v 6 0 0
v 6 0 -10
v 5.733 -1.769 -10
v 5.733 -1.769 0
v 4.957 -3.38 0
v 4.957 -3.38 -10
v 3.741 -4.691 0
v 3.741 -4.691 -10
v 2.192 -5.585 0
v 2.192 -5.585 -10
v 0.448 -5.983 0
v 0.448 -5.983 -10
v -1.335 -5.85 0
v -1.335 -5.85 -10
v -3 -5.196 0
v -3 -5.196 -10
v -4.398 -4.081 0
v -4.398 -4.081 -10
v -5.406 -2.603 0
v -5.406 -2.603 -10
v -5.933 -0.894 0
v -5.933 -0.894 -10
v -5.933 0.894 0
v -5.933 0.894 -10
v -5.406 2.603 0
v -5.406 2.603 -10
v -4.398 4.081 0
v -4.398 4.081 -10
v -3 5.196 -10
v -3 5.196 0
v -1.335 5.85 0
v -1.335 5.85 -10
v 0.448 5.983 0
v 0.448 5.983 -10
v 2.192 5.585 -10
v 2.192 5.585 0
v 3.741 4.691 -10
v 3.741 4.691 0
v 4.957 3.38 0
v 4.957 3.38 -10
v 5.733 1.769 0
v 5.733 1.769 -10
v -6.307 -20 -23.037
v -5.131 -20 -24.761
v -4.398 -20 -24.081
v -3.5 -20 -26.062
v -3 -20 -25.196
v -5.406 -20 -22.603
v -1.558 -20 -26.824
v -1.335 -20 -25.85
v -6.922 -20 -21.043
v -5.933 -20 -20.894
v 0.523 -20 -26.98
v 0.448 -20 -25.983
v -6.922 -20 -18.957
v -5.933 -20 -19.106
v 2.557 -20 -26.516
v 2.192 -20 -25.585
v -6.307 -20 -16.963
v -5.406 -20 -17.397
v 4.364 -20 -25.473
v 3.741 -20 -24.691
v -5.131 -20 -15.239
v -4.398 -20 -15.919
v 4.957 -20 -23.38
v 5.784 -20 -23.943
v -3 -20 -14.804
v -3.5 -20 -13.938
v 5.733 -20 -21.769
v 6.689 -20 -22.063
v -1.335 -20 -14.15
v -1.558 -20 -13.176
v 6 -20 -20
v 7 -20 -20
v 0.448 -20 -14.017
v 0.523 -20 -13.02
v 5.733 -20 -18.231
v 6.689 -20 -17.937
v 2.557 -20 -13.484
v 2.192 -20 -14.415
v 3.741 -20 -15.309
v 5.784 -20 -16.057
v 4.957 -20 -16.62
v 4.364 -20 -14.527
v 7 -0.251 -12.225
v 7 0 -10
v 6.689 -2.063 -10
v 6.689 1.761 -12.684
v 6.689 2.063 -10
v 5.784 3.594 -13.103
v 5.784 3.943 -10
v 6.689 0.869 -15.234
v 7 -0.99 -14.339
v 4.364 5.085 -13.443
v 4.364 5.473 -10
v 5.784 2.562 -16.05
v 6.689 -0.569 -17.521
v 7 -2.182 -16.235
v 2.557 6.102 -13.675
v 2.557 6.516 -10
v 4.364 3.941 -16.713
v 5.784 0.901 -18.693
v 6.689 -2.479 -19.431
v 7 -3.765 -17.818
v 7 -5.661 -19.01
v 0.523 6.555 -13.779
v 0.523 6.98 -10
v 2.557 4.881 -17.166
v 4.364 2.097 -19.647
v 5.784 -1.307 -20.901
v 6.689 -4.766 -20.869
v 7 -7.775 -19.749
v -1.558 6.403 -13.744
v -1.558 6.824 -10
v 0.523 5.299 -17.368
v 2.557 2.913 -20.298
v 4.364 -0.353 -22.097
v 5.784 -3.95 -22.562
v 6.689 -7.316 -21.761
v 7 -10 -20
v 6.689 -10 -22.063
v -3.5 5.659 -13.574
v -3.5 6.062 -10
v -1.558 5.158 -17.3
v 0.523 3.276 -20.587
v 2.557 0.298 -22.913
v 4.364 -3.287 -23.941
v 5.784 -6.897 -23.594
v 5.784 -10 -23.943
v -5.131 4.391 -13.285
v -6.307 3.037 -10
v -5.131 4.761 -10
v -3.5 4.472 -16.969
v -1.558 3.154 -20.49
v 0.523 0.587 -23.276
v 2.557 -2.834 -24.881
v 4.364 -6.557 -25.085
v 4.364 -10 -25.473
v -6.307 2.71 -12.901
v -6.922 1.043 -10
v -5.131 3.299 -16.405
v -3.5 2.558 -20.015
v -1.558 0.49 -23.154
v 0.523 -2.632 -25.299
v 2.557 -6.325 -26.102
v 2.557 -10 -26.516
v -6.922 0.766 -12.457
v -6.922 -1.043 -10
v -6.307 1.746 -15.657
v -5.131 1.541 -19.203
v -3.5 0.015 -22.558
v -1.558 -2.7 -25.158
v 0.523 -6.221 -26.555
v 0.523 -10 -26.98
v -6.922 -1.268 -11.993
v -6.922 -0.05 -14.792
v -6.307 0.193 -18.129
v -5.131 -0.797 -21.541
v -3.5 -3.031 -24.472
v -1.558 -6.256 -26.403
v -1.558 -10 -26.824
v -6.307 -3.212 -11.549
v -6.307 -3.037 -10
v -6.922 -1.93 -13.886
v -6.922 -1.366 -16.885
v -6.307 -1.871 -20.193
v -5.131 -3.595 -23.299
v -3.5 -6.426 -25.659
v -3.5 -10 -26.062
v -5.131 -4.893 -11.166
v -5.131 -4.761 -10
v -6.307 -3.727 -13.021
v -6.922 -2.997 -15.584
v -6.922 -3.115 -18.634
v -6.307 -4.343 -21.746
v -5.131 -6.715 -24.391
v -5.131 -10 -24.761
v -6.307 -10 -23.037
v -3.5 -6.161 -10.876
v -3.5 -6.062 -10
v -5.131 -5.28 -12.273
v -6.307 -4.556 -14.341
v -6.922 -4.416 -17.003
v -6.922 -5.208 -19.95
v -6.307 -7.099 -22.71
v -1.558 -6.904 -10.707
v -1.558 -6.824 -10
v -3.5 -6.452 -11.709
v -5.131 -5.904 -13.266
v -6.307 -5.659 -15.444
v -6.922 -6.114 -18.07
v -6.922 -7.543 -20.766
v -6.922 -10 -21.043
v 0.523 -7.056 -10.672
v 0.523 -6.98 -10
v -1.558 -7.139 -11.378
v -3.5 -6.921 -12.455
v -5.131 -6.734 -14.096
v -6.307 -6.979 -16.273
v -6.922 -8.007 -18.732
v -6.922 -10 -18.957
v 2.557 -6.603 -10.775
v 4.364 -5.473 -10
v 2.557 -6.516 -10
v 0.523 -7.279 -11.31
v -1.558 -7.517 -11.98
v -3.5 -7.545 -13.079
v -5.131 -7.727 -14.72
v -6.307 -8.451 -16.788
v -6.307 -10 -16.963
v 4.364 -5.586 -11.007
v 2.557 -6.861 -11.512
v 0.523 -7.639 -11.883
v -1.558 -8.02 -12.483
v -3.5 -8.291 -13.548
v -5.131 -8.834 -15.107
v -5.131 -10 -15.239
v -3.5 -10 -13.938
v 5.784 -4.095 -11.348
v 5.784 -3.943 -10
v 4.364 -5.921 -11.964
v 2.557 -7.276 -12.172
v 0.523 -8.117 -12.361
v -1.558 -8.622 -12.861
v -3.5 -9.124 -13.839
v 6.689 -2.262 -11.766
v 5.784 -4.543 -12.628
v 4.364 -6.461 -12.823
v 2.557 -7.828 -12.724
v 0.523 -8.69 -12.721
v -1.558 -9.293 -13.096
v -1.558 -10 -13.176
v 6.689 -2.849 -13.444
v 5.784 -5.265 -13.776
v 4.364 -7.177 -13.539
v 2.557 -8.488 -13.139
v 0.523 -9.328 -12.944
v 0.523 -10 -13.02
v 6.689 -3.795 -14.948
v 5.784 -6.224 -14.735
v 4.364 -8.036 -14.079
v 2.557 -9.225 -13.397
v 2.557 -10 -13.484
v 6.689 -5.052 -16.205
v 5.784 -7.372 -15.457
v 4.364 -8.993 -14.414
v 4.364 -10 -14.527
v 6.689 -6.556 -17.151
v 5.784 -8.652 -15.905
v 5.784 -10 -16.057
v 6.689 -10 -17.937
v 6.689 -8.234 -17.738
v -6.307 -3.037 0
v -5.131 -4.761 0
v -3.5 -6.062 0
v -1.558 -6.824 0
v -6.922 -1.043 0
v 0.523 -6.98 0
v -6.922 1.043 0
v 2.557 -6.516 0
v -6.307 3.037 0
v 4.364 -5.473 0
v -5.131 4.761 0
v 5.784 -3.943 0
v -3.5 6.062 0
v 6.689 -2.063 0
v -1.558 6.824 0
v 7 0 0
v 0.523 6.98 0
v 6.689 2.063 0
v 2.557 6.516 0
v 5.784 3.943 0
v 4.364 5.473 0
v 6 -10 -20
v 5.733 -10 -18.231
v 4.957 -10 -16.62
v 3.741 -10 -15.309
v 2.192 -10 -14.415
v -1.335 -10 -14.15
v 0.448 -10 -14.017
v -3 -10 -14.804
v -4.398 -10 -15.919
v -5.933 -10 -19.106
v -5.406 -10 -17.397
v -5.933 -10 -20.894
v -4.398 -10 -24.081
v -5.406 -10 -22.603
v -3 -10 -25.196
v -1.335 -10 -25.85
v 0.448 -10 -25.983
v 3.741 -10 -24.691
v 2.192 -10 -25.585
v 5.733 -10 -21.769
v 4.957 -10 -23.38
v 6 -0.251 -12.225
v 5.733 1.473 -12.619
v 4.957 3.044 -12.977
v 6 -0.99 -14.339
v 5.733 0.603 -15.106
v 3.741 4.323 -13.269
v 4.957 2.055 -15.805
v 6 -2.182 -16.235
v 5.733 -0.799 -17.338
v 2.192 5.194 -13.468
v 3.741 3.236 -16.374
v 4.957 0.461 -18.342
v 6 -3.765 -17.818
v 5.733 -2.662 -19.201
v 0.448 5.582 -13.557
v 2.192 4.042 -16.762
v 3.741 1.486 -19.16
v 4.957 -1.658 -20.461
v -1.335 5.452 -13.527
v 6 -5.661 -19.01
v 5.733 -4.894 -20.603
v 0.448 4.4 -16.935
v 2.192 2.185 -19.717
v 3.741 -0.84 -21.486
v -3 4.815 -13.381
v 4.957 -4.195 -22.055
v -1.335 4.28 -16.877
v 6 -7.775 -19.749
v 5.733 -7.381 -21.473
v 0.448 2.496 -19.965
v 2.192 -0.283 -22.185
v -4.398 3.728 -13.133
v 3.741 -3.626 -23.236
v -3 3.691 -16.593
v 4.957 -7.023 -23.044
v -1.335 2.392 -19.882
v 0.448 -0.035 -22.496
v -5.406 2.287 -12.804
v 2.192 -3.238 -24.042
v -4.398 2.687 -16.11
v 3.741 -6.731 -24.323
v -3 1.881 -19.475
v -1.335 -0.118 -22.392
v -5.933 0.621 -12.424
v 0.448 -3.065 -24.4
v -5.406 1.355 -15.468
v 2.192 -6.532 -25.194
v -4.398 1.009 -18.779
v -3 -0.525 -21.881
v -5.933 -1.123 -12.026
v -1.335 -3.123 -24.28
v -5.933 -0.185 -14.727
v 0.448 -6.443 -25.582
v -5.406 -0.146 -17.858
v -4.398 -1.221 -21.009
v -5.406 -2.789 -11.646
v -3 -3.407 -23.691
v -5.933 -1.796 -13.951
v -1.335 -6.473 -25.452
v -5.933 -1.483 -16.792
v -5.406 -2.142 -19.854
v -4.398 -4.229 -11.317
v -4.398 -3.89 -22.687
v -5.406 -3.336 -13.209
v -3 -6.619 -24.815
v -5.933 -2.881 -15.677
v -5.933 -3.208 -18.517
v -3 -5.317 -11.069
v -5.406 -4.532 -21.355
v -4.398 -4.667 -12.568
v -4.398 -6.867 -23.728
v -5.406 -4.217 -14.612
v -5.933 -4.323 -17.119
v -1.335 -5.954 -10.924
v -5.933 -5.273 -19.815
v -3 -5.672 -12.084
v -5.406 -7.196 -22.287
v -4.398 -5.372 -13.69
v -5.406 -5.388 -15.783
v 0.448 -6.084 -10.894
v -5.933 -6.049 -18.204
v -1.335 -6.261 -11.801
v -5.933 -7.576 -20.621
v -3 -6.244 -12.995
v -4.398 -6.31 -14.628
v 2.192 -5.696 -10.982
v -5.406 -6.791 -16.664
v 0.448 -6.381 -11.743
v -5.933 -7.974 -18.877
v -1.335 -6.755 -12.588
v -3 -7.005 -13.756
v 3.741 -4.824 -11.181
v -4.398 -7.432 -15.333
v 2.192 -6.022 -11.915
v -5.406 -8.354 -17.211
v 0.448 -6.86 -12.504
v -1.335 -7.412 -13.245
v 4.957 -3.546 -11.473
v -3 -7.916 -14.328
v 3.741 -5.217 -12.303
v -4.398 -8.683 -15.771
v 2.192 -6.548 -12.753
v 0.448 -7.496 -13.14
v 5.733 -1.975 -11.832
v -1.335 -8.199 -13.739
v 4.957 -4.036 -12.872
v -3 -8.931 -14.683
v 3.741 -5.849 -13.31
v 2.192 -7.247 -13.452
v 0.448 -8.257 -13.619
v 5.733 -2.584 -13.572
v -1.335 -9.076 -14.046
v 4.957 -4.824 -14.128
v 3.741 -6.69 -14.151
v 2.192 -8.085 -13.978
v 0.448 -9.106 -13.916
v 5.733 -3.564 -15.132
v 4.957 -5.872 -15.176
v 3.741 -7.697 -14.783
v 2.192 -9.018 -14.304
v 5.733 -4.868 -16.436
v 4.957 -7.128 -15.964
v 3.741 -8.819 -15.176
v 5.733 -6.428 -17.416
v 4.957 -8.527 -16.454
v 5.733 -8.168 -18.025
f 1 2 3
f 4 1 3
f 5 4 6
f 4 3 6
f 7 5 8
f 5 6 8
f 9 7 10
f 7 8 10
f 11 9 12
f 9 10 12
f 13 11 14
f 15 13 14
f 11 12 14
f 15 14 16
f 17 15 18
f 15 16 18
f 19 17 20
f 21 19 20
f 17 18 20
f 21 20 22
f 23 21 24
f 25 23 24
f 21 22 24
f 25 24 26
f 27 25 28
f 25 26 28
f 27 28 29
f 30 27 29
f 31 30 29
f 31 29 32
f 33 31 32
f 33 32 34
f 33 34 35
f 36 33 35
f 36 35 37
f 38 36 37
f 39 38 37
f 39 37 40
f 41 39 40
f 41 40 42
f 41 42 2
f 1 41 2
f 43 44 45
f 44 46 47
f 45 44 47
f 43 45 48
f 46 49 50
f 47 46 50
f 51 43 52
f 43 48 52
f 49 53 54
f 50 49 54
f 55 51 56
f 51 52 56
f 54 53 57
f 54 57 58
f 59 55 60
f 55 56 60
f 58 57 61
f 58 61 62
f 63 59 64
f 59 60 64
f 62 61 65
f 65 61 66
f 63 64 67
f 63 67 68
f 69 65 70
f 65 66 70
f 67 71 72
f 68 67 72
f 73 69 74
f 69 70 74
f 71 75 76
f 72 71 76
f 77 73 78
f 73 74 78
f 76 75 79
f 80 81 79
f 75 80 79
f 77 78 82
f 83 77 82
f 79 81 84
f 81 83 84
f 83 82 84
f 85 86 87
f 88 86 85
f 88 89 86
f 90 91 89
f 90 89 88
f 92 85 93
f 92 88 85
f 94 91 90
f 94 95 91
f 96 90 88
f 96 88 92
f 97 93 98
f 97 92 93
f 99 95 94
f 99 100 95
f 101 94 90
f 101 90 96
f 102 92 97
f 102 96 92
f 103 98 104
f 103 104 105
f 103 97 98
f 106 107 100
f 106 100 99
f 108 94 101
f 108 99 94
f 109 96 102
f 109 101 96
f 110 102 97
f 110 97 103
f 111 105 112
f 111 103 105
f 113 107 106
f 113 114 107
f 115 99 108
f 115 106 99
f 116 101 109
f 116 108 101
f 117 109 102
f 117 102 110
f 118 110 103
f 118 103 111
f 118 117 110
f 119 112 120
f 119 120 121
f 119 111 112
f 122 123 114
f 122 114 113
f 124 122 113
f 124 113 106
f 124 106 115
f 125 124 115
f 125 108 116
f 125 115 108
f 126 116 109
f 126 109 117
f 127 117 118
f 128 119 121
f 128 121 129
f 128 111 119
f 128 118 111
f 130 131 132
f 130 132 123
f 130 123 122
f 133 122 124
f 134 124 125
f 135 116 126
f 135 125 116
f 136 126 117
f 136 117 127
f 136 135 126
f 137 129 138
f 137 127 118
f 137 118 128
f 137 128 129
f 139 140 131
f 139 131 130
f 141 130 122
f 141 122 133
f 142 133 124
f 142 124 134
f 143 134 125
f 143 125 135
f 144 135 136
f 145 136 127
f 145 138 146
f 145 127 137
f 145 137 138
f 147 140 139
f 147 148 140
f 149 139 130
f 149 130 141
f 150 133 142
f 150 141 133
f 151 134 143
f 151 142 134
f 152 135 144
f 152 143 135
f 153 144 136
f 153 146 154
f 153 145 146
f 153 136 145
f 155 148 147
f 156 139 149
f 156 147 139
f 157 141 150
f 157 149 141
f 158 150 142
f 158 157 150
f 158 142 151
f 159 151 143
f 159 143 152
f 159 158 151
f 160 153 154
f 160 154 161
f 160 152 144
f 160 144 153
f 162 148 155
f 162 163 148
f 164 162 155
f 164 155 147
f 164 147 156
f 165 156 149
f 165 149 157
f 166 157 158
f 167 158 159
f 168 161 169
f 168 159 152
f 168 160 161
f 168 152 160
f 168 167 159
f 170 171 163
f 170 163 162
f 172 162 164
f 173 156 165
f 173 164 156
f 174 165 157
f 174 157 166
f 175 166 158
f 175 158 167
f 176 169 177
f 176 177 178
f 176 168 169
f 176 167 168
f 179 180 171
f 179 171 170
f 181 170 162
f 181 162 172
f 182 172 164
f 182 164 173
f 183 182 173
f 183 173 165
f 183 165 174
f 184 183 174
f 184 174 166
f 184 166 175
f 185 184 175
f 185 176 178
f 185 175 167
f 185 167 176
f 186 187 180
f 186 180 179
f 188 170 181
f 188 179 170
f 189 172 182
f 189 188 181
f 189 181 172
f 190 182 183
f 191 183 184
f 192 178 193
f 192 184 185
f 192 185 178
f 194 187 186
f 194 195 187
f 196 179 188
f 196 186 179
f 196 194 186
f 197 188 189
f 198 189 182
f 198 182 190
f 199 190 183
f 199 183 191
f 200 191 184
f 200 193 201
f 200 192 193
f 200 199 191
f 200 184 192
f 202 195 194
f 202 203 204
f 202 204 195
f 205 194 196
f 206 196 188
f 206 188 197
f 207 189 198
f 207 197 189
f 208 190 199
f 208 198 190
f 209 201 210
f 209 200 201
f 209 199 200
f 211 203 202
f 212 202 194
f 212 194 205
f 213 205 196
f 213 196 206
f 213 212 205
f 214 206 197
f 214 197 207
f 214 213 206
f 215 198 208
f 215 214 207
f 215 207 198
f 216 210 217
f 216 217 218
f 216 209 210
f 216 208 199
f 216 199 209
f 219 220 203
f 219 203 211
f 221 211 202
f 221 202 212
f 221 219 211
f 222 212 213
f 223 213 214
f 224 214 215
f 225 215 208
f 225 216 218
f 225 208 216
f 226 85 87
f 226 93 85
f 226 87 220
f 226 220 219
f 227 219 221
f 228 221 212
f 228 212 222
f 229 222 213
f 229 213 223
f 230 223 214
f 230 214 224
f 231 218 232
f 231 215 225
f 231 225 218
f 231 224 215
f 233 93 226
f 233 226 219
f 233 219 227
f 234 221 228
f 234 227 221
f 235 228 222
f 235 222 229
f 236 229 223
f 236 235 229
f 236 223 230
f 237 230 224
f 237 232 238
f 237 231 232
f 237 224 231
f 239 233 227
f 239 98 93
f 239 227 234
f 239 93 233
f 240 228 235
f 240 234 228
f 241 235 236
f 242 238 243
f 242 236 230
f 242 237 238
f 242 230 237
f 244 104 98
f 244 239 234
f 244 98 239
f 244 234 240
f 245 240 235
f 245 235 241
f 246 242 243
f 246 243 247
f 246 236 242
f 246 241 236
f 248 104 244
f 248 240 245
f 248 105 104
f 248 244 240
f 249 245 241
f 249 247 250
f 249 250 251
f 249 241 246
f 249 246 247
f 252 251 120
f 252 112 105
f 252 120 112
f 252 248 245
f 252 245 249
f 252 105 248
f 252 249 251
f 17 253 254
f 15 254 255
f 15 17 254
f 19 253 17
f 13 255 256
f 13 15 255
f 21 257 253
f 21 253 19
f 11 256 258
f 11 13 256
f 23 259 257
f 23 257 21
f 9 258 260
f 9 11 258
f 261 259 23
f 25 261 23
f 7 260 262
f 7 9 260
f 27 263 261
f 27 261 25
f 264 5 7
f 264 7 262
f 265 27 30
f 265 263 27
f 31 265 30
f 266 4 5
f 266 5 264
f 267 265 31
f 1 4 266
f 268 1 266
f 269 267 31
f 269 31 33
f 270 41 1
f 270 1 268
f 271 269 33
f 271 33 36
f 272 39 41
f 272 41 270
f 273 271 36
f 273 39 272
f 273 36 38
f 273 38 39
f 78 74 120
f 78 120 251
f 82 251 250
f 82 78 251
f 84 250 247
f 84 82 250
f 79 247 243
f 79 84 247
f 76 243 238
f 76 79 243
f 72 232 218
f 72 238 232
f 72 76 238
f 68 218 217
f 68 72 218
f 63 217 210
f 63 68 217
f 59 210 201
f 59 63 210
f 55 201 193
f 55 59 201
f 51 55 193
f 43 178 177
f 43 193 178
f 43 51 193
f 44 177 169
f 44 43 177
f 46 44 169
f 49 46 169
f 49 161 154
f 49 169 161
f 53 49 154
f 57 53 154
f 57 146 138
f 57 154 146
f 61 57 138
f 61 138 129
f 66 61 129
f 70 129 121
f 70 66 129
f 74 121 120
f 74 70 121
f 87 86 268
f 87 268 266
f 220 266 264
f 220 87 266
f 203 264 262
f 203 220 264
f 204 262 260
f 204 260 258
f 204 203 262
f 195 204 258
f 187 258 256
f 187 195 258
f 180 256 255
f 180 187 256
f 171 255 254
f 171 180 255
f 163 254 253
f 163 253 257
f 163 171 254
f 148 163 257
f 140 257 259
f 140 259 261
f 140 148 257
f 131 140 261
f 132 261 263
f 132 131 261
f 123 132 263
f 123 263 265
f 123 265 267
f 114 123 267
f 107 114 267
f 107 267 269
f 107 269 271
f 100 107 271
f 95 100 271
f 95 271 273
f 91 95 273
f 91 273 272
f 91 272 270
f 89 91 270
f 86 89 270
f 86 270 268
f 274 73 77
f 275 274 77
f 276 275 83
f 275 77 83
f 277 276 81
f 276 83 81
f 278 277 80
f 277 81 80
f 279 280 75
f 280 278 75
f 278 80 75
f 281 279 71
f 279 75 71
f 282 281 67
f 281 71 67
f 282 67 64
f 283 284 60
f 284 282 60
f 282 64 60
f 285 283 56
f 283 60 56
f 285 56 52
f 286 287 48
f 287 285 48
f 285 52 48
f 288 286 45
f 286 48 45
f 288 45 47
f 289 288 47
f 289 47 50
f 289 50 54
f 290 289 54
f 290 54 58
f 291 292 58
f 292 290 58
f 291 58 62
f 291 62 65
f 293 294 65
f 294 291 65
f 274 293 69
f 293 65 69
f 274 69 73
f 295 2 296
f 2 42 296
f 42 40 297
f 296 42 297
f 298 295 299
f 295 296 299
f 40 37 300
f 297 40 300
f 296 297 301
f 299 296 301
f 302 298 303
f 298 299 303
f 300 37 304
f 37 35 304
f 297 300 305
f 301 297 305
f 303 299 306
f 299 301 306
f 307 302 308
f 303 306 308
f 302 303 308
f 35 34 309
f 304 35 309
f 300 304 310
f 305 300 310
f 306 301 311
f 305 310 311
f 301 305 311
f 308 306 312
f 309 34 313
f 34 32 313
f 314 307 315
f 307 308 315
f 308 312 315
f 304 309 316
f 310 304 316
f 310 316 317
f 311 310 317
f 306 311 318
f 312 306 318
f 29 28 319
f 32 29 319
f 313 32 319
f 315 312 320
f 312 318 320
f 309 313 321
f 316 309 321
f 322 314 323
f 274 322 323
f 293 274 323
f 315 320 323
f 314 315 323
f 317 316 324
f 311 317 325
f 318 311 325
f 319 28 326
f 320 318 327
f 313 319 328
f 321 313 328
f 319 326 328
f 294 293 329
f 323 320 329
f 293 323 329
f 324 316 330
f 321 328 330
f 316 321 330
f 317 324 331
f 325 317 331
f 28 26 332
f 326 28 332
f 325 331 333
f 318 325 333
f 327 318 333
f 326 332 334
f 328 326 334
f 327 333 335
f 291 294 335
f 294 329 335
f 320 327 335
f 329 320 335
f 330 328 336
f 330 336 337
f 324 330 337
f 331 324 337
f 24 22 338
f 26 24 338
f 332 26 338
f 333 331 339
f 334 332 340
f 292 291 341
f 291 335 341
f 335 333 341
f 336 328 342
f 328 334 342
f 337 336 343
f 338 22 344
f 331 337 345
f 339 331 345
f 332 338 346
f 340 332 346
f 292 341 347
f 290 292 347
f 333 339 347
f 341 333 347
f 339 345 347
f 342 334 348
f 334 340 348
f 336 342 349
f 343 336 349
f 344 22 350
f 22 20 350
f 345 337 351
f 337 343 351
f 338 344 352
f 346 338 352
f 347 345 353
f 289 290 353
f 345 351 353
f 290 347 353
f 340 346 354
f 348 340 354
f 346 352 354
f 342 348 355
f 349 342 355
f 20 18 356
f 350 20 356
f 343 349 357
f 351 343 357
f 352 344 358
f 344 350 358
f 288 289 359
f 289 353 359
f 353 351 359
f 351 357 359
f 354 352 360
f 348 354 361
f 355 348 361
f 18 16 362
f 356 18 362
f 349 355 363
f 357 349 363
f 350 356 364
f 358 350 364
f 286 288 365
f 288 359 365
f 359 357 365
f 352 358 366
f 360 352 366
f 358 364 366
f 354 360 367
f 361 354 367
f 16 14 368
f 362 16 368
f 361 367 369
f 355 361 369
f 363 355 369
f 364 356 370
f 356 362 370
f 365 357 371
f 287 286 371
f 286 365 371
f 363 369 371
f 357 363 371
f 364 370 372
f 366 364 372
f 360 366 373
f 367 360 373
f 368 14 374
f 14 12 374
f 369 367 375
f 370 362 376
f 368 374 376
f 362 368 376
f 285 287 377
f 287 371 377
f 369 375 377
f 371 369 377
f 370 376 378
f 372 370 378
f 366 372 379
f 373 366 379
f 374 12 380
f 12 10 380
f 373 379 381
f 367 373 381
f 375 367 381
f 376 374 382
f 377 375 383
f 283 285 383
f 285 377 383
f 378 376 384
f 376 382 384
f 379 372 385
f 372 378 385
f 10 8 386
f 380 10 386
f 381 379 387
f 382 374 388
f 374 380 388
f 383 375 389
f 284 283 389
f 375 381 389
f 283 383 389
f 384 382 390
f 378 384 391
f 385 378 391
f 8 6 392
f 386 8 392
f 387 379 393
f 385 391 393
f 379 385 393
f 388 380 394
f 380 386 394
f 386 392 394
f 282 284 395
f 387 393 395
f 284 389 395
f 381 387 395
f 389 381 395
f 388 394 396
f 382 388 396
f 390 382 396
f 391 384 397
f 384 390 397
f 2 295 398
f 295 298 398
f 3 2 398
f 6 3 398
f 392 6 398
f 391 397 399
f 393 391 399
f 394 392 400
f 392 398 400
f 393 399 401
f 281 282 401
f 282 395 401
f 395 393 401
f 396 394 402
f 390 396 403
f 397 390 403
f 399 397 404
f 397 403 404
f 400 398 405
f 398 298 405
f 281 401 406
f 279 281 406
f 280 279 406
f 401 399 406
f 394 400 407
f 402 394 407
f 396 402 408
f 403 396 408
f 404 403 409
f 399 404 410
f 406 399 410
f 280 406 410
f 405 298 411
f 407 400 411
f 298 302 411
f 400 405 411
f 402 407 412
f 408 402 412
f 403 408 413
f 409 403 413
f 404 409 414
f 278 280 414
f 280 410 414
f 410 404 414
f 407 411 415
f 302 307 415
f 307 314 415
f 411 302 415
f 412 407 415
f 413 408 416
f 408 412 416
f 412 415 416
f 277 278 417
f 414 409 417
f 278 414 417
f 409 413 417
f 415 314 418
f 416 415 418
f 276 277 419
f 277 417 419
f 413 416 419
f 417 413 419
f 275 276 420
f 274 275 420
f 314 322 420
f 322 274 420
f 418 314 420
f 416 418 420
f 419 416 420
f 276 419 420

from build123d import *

# Parameters (mm, degrees)
SKETCH_1_R = 7
SKETCH_3_R = 6


with BuildPart() as part:
    # Sweep 1: sweep along a path in 草图2
    with BuildLine(Plane(origin=(0, 0, 0), x_dir=(0, 0, -1), z_dir=(1, 0, 0))) as sweep_1_path:
        Line((0, 0), (10, 0))
        ThreePointArc((10, 0), (17.071067812, -2.928932188), (20, -10))
        Line((20, -10), (20, -20))
    # 草图1 → Sweep 1 (sweep)
    with BuildSketch(Plane.XY):
        Circle(SKETCH_1_R)
    sweep(path=sweep_1_path.line)

    # Sweep 1 2: sweep along a path in 草图4
    with BuildLine(Plane(origin=(0, 0, 0), x_dir=(0, 0, -1), z_dir=(1, 0, 0))) as sweep_1_2_path:
        Line((0, 0), (10, 0))
        ThreePointArc((10, 0), (17.071067812, -2.928932188), (20, -10))
        Line((20, -10), (20, -20))
    # 草图3 → Sweep 1 2 (sweep, cut)
    with BuildSketch(Plane.XY):
        Circle(SKETCH_3_R)
    sweep(path=sweep_1_2_path.line, mode=Mode.SUBTRACT)


solid = part.part
